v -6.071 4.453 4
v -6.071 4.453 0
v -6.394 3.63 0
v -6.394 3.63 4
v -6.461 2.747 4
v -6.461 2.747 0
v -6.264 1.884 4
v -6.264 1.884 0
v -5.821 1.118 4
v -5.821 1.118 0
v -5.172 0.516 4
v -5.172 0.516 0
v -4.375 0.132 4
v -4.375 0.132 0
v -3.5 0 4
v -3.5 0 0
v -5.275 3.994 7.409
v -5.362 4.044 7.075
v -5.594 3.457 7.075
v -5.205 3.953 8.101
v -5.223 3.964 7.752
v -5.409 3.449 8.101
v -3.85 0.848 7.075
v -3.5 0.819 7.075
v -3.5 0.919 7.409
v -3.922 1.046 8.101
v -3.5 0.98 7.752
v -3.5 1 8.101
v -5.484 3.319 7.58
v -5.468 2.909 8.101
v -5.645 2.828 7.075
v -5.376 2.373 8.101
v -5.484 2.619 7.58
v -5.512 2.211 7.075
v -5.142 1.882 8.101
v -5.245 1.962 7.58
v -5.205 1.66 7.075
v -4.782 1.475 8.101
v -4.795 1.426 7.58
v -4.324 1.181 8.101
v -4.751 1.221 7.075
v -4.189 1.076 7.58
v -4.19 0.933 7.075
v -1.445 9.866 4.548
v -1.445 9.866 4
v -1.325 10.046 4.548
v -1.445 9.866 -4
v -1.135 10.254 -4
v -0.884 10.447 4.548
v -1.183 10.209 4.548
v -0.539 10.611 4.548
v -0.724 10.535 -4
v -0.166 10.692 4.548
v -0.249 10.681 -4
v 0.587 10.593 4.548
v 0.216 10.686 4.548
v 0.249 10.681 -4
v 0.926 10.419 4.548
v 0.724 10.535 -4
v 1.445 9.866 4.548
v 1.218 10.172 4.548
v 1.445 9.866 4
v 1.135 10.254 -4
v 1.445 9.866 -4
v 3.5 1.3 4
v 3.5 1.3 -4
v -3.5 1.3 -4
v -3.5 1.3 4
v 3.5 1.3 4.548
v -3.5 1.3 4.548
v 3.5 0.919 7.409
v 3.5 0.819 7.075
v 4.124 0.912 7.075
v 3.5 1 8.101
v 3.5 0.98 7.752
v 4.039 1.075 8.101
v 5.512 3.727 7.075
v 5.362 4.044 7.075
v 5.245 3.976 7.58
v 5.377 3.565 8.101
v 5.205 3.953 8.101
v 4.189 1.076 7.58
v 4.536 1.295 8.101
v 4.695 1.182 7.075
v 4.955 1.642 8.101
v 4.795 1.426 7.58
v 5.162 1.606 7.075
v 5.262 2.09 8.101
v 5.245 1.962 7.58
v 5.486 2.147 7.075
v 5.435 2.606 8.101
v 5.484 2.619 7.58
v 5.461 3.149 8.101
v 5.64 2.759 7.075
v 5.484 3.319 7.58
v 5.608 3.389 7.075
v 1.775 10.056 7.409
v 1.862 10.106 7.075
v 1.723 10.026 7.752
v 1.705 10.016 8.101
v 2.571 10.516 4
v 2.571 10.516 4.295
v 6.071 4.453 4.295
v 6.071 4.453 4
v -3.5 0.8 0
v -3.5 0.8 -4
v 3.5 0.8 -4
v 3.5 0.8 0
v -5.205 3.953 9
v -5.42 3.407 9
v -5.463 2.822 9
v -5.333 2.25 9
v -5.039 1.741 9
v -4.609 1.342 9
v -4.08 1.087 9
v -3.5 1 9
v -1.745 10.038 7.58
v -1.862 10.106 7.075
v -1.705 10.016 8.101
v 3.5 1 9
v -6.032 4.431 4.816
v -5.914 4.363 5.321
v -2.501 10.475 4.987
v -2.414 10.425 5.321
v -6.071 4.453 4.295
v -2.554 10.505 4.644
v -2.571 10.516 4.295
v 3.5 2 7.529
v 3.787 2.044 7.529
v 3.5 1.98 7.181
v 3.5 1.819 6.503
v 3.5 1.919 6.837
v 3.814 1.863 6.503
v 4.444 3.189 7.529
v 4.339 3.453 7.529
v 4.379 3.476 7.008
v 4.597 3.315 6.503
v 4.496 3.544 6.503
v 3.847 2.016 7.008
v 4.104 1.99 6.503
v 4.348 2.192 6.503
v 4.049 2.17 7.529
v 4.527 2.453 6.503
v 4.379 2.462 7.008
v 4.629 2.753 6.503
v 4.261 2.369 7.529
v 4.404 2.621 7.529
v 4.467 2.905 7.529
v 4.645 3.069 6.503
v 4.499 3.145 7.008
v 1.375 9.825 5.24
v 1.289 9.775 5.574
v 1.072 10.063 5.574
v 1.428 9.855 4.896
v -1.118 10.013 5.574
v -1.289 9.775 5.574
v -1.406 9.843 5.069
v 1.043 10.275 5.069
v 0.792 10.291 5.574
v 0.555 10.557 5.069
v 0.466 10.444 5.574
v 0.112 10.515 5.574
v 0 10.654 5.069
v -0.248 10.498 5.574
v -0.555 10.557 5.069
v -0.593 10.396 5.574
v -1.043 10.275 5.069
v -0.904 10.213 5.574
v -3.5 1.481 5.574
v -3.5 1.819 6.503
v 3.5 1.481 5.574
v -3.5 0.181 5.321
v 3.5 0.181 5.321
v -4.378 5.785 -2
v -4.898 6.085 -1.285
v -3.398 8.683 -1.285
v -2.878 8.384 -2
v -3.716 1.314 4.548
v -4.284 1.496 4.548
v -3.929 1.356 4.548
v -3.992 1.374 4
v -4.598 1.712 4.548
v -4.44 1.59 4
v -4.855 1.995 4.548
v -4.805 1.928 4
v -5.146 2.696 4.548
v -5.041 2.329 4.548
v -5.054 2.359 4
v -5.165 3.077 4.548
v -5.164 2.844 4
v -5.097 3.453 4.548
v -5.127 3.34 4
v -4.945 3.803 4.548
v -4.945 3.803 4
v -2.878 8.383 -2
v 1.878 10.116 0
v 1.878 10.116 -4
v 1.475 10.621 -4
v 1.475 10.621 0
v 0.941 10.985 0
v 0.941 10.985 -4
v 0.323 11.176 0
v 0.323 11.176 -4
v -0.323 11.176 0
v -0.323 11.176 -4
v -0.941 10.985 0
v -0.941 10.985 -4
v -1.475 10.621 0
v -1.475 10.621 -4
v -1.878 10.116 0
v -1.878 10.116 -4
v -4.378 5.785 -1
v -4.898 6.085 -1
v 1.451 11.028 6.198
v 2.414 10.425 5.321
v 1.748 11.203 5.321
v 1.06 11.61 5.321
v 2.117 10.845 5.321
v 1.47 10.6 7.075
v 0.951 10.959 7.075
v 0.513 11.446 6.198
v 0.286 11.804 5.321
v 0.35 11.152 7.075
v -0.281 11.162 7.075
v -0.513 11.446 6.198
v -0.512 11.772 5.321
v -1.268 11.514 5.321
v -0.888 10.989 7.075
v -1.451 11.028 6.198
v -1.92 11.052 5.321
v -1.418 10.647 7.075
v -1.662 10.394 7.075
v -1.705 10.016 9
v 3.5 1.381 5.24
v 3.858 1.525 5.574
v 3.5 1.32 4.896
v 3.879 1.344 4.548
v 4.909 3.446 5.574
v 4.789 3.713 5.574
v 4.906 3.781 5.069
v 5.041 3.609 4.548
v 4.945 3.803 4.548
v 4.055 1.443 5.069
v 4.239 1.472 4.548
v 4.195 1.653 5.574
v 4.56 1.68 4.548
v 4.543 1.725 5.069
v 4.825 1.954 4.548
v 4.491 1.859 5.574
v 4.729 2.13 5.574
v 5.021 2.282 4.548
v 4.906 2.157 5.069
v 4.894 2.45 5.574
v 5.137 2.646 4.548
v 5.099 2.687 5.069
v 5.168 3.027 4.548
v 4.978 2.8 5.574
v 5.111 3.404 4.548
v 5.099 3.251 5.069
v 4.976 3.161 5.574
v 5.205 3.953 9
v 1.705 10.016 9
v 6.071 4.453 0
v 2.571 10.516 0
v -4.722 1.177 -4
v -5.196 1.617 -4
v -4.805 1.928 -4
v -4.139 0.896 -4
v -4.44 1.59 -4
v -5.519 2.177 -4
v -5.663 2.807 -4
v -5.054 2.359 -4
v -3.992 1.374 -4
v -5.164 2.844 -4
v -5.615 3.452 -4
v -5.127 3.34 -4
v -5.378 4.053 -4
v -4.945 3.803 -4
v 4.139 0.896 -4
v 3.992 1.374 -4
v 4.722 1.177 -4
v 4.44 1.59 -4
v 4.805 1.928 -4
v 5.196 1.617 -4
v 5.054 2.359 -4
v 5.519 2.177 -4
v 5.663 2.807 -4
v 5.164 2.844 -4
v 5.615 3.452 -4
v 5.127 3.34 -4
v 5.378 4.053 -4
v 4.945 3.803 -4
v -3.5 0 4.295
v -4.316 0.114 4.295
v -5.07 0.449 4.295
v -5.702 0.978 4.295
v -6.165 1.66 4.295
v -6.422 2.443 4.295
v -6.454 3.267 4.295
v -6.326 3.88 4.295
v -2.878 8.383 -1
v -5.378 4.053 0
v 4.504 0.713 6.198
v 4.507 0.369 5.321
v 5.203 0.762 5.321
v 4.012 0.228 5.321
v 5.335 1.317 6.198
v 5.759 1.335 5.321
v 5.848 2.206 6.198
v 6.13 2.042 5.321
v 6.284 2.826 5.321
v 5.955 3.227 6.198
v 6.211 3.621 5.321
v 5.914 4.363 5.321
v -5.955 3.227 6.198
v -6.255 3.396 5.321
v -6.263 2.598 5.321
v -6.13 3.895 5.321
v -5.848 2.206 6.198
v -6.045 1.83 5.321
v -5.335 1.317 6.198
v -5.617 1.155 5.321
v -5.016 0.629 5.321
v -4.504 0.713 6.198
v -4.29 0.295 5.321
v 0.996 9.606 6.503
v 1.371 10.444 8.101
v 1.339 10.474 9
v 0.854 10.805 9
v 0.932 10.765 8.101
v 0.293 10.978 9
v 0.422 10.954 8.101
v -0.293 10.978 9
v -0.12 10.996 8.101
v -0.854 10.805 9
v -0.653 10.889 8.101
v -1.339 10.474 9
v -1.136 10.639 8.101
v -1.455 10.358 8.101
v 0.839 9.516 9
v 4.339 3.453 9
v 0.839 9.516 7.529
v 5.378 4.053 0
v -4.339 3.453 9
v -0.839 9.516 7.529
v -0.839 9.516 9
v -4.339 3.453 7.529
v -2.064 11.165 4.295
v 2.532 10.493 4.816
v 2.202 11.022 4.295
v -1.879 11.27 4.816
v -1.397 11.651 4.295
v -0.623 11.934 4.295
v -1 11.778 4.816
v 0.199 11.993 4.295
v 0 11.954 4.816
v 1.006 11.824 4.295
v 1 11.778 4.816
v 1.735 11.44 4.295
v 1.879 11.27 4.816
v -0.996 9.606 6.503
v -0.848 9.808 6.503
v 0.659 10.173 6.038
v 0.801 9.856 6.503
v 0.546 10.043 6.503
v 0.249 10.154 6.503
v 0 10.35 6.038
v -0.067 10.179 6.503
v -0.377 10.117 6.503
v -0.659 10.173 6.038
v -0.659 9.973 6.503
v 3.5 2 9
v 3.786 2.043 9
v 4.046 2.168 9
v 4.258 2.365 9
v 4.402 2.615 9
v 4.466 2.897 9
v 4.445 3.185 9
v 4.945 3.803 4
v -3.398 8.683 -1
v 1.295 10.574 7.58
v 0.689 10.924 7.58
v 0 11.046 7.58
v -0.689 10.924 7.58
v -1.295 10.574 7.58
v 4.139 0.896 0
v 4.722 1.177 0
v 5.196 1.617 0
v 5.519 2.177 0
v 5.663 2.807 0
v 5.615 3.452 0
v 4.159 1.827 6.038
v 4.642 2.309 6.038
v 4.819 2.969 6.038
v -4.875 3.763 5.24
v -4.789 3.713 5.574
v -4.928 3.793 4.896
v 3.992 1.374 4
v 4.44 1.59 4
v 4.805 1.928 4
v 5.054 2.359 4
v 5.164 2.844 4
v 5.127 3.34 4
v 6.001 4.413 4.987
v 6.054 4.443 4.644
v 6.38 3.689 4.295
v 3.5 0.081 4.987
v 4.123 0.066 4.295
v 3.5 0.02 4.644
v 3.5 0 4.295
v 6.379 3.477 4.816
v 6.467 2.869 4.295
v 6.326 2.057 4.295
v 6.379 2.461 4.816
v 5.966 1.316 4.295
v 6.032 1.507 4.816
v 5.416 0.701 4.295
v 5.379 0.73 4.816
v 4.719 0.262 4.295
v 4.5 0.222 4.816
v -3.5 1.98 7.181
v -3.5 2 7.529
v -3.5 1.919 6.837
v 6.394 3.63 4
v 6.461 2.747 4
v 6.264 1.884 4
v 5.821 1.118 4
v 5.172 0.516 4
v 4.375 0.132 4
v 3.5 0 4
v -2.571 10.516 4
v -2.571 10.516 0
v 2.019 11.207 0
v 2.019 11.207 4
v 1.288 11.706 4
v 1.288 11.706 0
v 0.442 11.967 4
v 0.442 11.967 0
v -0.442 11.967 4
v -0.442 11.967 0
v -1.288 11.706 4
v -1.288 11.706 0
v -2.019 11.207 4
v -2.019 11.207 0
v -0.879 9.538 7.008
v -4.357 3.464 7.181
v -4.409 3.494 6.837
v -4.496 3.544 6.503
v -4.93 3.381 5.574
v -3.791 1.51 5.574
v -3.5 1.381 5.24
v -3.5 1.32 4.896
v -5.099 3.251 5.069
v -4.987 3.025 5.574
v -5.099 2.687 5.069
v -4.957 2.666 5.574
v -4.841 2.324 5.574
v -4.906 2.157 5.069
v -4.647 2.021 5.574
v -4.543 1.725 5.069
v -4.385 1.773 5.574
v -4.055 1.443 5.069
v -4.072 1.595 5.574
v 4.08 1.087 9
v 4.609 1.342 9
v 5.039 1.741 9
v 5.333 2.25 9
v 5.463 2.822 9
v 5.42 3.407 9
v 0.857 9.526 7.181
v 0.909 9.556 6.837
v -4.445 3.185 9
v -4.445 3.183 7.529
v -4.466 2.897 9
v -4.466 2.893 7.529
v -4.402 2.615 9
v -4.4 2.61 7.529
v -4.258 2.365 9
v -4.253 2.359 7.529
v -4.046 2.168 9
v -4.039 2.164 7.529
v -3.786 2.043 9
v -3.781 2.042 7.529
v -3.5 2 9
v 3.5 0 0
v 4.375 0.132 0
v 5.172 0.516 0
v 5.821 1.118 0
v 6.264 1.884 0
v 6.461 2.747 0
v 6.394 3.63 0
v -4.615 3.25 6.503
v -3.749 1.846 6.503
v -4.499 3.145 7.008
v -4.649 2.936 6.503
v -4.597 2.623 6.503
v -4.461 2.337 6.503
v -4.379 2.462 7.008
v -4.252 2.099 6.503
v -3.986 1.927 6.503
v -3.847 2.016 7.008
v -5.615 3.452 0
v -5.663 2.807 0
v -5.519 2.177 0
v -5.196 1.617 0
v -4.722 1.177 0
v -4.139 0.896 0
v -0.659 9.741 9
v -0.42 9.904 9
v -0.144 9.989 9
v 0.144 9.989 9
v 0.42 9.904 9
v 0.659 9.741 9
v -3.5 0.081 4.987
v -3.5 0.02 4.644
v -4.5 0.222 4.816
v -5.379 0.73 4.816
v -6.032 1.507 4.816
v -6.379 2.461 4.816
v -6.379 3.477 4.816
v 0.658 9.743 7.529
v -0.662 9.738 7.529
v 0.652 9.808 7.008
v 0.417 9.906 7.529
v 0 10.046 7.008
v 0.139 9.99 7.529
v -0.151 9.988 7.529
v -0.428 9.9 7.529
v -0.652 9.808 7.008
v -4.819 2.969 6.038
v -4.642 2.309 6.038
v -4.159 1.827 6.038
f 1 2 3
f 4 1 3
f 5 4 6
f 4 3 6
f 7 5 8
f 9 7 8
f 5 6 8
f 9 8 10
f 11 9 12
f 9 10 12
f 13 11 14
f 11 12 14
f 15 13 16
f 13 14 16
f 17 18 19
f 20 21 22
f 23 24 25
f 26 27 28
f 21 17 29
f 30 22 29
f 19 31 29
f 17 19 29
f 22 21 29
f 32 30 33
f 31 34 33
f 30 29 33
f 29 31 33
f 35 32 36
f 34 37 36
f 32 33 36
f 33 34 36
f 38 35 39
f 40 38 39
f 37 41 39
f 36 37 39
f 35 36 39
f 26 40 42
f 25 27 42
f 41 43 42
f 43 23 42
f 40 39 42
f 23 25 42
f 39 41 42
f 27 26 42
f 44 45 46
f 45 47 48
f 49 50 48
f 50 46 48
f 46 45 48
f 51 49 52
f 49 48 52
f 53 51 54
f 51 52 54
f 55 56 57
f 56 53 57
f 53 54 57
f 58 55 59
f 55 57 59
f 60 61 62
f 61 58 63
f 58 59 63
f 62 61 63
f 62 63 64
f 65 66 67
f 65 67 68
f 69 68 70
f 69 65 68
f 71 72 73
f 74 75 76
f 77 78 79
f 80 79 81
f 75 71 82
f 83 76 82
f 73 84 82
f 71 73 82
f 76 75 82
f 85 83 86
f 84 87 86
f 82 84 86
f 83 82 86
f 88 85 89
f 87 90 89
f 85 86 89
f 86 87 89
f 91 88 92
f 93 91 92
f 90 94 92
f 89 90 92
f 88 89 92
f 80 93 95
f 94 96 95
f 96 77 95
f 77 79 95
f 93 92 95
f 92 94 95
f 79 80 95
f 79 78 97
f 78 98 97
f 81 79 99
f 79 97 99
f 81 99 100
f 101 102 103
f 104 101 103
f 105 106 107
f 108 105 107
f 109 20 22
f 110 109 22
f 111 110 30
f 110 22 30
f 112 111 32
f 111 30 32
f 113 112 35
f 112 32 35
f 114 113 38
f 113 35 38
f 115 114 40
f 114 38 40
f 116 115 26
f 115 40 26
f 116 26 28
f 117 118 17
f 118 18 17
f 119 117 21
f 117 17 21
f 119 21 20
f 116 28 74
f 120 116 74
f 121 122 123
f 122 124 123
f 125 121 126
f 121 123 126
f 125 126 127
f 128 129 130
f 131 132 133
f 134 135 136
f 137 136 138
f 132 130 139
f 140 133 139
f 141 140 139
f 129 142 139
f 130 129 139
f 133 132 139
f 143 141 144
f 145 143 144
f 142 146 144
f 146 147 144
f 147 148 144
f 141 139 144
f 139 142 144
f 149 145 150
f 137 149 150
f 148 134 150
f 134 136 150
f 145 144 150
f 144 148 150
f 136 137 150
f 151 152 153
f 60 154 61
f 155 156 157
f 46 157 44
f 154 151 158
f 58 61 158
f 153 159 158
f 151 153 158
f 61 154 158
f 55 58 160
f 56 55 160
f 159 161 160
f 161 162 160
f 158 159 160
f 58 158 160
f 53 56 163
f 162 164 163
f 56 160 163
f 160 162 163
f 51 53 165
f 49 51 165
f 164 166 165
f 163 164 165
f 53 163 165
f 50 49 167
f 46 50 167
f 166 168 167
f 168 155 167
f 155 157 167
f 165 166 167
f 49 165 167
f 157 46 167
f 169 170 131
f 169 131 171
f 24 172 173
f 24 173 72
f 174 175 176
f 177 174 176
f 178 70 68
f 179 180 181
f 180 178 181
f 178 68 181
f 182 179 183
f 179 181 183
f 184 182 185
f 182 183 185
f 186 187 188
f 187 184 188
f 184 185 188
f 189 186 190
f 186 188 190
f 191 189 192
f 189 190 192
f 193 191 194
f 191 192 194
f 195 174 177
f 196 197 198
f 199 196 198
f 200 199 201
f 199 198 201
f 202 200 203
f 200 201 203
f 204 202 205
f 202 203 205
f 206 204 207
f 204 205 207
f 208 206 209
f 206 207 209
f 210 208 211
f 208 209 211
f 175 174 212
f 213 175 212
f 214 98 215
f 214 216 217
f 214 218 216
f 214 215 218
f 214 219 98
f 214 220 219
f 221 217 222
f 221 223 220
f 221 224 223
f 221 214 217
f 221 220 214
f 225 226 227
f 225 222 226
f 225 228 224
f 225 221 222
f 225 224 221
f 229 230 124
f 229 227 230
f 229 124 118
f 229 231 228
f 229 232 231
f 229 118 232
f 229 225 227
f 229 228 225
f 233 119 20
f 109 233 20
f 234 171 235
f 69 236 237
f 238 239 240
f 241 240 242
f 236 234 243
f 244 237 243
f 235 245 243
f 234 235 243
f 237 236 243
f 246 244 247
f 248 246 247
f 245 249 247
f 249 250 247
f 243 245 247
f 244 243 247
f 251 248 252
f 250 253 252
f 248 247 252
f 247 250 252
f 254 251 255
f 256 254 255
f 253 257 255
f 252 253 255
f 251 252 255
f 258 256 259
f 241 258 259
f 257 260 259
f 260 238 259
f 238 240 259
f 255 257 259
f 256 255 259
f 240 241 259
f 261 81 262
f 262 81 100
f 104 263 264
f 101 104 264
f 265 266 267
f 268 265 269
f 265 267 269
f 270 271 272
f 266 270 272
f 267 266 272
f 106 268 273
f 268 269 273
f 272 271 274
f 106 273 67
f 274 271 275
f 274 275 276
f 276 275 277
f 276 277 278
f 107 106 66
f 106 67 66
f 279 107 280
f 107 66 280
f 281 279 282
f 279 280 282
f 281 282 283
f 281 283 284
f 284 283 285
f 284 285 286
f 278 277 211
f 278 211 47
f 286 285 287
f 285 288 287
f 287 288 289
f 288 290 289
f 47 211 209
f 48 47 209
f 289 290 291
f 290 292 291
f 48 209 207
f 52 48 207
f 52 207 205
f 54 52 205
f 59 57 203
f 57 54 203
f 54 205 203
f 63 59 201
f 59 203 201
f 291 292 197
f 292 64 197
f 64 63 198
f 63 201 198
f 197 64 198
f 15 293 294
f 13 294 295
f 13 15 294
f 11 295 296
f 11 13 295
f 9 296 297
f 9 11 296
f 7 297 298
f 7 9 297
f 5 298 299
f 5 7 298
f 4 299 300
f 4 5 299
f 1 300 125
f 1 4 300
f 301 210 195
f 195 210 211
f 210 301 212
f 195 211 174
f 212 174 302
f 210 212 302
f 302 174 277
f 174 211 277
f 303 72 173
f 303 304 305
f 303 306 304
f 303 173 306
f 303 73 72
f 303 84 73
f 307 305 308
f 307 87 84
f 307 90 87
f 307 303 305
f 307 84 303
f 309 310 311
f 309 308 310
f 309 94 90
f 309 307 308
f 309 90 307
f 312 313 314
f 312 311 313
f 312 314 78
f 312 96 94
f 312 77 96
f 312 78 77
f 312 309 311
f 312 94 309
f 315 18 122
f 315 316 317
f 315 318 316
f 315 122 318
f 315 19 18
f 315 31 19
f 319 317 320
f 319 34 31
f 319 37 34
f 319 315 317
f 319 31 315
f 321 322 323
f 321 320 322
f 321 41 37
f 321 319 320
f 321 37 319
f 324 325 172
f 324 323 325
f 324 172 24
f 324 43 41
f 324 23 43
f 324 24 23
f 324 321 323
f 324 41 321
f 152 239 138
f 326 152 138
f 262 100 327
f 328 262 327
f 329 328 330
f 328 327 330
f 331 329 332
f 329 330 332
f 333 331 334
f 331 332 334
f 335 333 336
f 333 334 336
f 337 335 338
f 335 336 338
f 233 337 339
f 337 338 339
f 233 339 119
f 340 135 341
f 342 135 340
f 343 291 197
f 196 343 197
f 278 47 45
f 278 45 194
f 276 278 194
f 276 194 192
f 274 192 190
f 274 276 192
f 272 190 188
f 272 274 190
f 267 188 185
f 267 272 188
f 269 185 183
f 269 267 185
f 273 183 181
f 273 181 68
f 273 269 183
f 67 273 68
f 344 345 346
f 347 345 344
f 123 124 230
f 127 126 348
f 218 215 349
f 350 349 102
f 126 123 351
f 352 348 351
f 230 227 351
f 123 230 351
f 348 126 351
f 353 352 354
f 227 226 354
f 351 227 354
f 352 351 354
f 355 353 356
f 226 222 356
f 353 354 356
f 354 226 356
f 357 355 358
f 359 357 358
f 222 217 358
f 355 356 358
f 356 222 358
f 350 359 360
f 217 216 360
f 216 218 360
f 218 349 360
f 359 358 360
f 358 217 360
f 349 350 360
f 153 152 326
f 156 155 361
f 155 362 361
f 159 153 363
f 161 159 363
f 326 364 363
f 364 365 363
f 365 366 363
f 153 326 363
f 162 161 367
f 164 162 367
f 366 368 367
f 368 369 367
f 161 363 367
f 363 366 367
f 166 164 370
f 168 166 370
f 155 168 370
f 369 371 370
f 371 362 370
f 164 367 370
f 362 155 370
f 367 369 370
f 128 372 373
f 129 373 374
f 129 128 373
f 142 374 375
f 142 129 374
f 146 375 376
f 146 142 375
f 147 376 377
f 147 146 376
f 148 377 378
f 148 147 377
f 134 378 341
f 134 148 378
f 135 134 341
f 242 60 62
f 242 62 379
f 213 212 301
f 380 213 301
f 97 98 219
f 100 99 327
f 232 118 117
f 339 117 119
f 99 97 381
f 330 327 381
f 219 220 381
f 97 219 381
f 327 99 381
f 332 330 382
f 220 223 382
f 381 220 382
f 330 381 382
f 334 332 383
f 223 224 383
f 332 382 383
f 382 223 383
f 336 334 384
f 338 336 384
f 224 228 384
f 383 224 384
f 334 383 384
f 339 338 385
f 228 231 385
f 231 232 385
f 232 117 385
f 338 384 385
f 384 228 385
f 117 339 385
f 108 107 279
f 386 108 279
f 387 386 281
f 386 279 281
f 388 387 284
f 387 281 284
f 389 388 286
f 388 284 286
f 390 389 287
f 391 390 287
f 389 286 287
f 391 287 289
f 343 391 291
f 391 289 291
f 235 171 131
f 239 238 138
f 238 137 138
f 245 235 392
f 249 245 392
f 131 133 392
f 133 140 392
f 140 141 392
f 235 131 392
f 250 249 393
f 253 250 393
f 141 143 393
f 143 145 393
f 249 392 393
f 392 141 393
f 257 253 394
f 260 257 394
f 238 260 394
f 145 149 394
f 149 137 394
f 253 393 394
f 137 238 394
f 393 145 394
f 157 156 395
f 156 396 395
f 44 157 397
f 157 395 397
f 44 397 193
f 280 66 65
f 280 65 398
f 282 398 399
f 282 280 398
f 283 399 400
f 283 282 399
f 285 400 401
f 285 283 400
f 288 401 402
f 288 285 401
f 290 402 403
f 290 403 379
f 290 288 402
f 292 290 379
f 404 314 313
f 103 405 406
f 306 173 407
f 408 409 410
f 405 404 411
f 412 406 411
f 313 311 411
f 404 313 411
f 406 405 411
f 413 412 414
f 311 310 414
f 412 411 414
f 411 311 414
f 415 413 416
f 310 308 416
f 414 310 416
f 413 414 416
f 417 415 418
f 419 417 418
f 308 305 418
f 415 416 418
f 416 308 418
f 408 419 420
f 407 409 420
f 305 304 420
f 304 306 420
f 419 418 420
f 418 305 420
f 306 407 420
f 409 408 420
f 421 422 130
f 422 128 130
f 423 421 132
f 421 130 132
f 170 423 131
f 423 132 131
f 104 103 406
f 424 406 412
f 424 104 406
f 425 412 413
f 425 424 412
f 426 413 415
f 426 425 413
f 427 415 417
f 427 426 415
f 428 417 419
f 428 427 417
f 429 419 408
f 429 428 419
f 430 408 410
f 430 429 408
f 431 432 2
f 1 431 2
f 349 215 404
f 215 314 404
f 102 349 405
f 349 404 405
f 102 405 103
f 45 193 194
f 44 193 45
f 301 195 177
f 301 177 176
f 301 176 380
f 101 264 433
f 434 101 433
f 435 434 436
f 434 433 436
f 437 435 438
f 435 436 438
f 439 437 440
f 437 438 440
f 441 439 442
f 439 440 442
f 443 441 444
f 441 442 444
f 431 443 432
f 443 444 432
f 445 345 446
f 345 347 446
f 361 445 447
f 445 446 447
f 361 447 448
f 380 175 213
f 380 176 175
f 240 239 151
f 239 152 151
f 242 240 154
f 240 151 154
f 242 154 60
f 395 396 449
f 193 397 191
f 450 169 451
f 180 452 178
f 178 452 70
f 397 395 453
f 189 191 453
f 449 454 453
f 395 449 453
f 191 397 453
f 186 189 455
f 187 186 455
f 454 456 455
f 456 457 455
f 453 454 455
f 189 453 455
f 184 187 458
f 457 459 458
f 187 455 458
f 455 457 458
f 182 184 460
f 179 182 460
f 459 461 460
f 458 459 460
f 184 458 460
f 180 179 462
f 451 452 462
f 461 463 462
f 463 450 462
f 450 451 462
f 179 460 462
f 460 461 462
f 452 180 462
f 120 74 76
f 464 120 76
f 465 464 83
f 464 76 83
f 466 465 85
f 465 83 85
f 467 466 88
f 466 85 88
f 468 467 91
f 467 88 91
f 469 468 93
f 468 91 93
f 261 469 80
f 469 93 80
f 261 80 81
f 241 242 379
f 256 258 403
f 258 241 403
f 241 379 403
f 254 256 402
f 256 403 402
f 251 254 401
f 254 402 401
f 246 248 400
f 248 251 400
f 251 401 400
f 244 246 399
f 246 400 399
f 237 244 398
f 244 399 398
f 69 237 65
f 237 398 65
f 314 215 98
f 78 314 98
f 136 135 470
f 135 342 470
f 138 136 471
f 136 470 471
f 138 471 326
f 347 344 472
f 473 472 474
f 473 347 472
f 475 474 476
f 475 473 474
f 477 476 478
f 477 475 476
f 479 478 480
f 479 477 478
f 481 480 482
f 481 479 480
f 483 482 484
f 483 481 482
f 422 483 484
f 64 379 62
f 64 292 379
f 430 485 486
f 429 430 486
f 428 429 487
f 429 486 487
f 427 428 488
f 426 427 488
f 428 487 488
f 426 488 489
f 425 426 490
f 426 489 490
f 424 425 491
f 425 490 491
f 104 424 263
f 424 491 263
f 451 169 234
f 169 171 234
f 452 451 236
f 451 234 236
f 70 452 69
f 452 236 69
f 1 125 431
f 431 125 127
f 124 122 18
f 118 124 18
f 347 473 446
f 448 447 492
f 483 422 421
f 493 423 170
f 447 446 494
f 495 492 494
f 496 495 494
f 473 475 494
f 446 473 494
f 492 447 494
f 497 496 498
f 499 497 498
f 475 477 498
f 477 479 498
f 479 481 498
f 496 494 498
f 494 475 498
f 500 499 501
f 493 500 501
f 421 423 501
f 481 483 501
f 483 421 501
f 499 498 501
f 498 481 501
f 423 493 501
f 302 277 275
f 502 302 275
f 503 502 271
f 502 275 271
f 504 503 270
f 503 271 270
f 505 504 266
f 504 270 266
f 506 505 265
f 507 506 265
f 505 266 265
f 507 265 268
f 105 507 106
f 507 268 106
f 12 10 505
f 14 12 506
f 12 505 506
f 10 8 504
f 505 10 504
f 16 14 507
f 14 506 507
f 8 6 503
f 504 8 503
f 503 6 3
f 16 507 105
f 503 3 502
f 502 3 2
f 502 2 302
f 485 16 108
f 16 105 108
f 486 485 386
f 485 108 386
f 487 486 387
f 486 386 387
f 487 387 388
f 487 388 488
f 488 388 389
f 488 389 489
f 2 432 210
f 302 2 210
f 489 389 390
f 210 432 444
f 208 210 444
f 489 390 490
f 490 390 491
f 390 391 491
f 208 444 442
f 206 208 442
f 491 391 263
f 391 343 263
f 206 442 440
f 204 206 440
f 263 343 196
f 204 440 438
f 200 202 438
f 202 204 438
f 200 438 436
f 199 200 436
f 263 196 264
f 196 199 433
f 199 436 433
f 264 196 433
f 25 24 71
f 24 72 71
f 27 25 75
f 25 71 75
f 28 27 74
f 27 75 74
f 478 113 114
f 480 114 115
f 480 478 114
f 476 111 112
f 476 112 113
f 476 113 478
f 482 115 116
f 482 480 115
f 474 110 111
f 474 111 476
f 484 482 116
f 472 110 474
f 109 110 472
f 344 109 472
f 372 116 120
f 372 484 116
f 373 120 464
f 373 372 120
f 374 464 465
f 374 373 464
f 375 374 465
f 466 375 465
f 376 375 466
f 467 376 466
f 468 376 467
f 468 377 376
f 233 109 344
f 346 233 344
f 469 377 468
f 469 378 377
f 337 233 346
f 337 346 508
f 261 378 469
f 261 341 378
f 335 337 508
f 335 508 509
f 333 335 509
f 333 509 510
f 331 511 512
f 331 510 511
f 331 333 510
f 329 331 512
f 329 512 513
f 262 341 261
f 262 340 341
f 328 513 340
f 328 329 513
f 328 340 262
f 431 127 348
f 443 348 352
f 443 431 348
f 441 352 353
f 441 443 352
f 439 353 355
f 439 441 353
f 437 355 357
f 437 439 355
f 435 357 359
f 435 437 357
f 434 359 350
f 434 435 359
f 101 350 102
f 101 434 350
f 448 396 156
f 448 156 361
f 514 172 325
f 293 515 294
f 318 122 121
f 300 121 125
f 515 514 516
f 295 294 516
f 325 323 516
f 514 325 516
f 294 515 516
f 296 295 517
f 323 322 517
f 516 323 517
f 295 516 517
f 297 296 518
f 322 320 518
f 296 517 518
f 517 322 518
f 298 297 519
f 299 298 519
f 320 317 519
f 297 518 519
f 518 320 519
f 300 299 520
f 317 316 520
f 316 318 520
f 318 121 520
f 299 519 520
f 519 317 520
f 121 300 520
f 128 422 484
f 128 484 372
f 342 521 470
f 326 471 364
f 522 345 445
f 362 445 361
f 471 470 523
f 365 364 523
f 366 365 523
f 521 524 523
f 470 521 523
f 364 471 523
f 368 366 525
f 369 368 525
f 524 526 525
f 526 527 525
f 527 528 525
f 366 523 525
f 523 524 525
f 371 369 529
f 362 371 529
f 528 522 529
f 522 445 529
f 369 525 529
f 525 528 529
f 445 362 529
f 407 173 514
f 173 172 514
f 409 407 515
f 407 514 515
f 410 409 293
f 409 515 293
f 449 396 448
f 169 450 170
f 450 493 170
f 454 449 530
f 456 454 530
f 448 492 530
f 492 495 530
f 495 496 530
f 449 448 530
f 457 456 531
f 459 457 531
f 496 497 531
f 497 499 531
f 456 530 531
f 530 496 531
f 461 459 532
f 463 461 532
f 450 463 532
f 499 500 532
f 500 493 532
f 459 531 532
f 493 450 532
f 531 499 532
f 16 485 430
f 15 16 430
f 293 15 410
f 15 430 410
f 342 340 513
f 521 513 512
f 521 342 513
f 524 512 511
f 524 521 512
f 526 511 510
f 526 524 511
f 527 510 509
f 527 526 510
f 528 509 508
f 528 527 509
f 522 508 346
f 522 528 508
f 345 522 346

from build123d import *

# Parameters (mm, degrees)
EXTRUDE_1_DEPTH  = 4
EXTRUDE_2_DEPTH  = 4
EXTRUDE_3_DEPTH  = 5
CHAMFER_1_SIZE   = 1.3
CHAMFER_1_SIZE_2 = 3.571720645
CHAMFER_2_SIZE   = 3
CHAMFER_2_SIZE_2 = 1.091910703
FILLET_1_R       = 3
SKETCH_5_W       = 1
SKETCH_5_H       = 3
EXTRUDE_4_DEPTH  = 0.6
CHAMFER_3_SIZE2  = 0.715052156
CHAMFER_3_SIZE   = 0.6


# Some blends are built 0.0001 mm under size
with BuildPart() as part:
    # Эскиз2 → Бобышка-Вытянуть1 (new body)
    with BuildSketch(Plane.XY.offset(-4)):
        with BuildLine():
            Line((5.3783321, 4.05336663), (1.8783321, 10.115544457))
            ThreePointArc((1.8783321, 10.115544457), (0, 11.2), (-1.8783321, 10.115544457))
            Line((-1.8783321, 10.115544457), (-5.3783321, 4.05336663))
            ThreePointArc((-5.3783321, 4.05336663), (-5.3783321, 1.884455543), (-3.5, 0.8))
            Line((-3.5, 0.8), (3.5, 0.8))
            ThreePointArc((3.5, 0.8), (5.3783321, 1.884455543), (5.3783321, 4.05336663))
        make_face()
        with BuildLine():
            Line((-1.445319398, 9.865544457), (-4.945319398, 3.80336663))
            ThreePointArc((-4.945319398, 3.80336663), (-4.945319398, 2.134455543), (-3.5, 1.3))
            Line((-3.5, 1.3), (3.5, 1.3))
            ThreePointArc((3.5, 1.3), (4.945319398, 2.134455543), (4.945319398, 3.80336663))
            Line((4.945319398, 3.80336663), (1.445319398, 9.865544457))
            ThreePointArc((1.445319398, 9.865544457), (0, 10.7), (-1.445319398, 9.865544457))
        make_face(mode=Mode.SUBTRACT)
    extrude(amount=EXTRUDE_1_DEPTH)

    # Эскиз3 → Бобышка-Вытянуть2 (add)
    with BuildSketch(Plane.XY):
        with BuildLine():
            Line((-3.5, 0), (3.5, 0))
            ThreePointArc((3.5, 0), (6.071152423, 1.484455543), (6.071152423, 4.45336663))
            Line((6.071152423, 4.45336663), (2.571152423, 10.515544457))
            ThreePointArc((2.571152423, 10.515544457), (0, 12), (-2.571152423, 10.515544457))
            Line((-2.571152423, 10.515544457), (-6.071152423, 4.45336663))
            ThreePointArc((-6.071152423, 4.45336663), (-6.071152423, 1.484455543), (-3.5, 0))
        make_face()
        with BuildLine():
            Line((4.945319398, 3.80336663), (1.445319398, 9.865544457))
            ThreePointArc((1.445319398, 9.865544457), (0, 10.7), (-1.445319398, 9.865544457))
            Line((-1.445319398, 9.865544457), (-4.945319398, 3.80336663))
            ThreePointArc((-4.945319398, 3.80336663), (-4.945319398, 2.134455543), (-3.5, 1.3))
            Line((-3.5, 1.3), (3.5, 1.3))
            ThreePointArc((3.5, 1.3), (4.945319398, 2.134455543), (4.945319398, 3.80336663))
        make_face(mode=Mode.SUBTRACT)
    extrude(amount=EXTRUDE_2_DEPTH)

    # Эскиз4 → Бобышка-Вытянуть3 (add)
    with BuildSketch(Plane.XY.offset(4)):
        with BuildLine():
            Line((-1.705127019, 10.015544457), (-5.205127019, 3.95336663))
            ThreePointArc((-5.205127019, 3.95336663), (-5.205127019, 1.984455543), (-3.5, 1))
            Line((-3.5, 1), (3.5, 1))
            ThreePointArc((3.5, 1), (5.205127019, 1.984455543), (5.205127019, 3.95336663))
            Line((5.205127019, 3.95336663), (1.705127019, 10.015544457))
            ThreePointArc((1.705127019, 10.015544457), (0, 11), (-1.705127019, 10.015544457))
        make_face()
        with BuildLine():
            Line((-3.5, 2), (3.5, 2))
            ThreePointArc((3.5, 2), (4.339101615, 2.484455543), (4.339101615, 3.45336663))
            Line((4.339101615, 3.45336663), (0.839101615, 9.515544457))
            ThreePointArc((0.839101615, 9.515544457), (0, 10), (-0.839101615, 9.515544457))
            Line((-0.839101615, 9.515544457), (-4.339101615, 3.45336663))
            ThreePointArc((-4.339101615, 3.45336663), (-4.339101615, 2.484455543), (-3.5, 2))
        make_face(mode=Mode.SUBTRACT)
    extrude(amount=EXTRUDE_3_DEPTH)

    # Фаска1
    # the kernel refuses this chamfer: 3.571720645, 1.3 mm, written as the material it adds along each edge
    with BuildSketch(Plane(origin=(-3.5, 1, 4), x_dir=(0, -0.9950833631817486, -0.09904090225205049), z_dir=(1, 0, 0))) as chamfer_1_piece_1_section:
        Polygon((CHAMFER_1_SIZE * 0.995083363182, -CHAMFER_1_SIZE * 0.0990409022521), (-CHAMFER_1_SIZE_2 * 0.0990409022601, -CHAMFER_1_SIZE_2 * 0.995083363263), (0, 0), align=None)
    chamfer_1_piece_1 = extrude(amount=7, mode=Mode.PRIVATE)
    chamfer_1_piece_1 = split(chamfer_1_piece_1, bisect_by=Plane(origin=(-7e-09, 0, 5.183770474), z_dir=(0, 1, 0)), keep=Keep.TOP, mode=Mode.PRIVATE)
    add(chamfer_1_piece_1)
    with BuildSketch(Plane(origin=(3.5, 2.968911087, 4), x_dir=(0, -1, 0), z_dir=(-1, 0, 0))) as chamfer_1_piece_2_section:
        Polygon((1.968911087 + CHAMFER_1_SIZE, 0), (1.968911087, CHAMFER_1_SIZE_2), (1.968911087, 0), align=None)
    chamfer_1_piece_2 = revolve(axis=Axis((3.5, 2.968911087, 4), (0, 0, 1)), revolution_arc=120, mode=Mode.PRIVATE)
    chamfer_1_piece_2 = chamfer_1_piece_2 & Plane(origin=(3.5, 2.968911087, 5.239170832), x_dir=(0, -1, 0), z_dir=(0, 0, -1)) * Cylinder(2.968911087, 15, mode=Mode.PRIVATE)
    add(chamfer_1_piece_2)
    with BuildSketch(Plane(origin=(-3.5, 2.968911087, 4), x_dir=(-0.8660254037844399, 0.4999999999999977, 0), z_dir=(0.4999999999999977, 0.8660254037844399, 0))) as chamfer_1_piece_3_section:
        Polygon((1.968911087 + CHAMFER_1_SIZE, 0), (1.968911087, CHAMFER_1_SIZE_2), (1.968911087, 0), align=None)
    chamfer_1_piece_3 = revolve(axis=Axis((-3.5, 2.968911087, 4), (0, 0, 1)), revolution_arc=120, mode=Mode.PRIVATE)
    chamfer_1_piece_3 = chamfer_1_piece_3 & Plane(origin=(-3.5, 2.968911087, 5.239170832), x_dir=(-0.8660254037844396, 0.4999999999999984, 0), z_dir=(0, 0, -1)) * Cylinder(2.968911087, 15, mode=Mode.PRIVATE)
    add(chamfer_1_piece_3)
    with BuildSketch(Plane(origin=(5.205127019, 3.95336663, 4), x_dir=(0.8617674713986507, 0.497541681590875, -0.09904090225205049), z_dir=(-0.5000000000000007, 0.8660254037844384, 0))) as chamfer_1_piece_4_section:
        Polygon((CHAMFER_1_SIZE * 0.995083363182, -CHAMFER_1_SIZE * 0.0990409022521), (-CHAMFER_1_SIZE_2 * 0.0990409022601, -CHAMFER_1_SIZE_2 * 0.995083363263), (0, 0), align=None)
    chamfer_1_piece_4 = extrude(amount=7, mode=Mode.PRIVATE)
    chamfer_1_piece_4 = split(chamfer_1_piece_4, bisect_by=Plane(origin=(4.321152424, 7.484455541, 5.183770458), z_dir=(-0.8660254037844383, -0.5000000000000007, 0)), keep=Keep.TOP, mode=Mode.PRIVATE)
    add(chamfer_1_piece_4)
    with BuildSketch(Plane(origin=(-1.705127019, 10.015544457, 4), x_dir=(-0.8617674713986511, 0.49754168159087425, -0.09904090225205052), z_dir=(-0.49999999999999994, -0.8660254037844387, 0))) as chamfer_1_piece_5_section:
        Polygon((CHAMFER_1_SIZE * 0.995083363182, -CHAMFER_1_SIZE * 0.0990409022521), (-CHAMFER_1_SIZE_2 * 0.0990409022601, -CHAMFER_1_SIZE_2 * 0.995083363263), (0, 0), align=None)
    chamfer_1_piece_5 = extrude(amount=7, mode=Mode.PRIVATE)
    chamfer_1_piece_5 = split(chamfer_1_piece_5, bisect_by=Plane(origin=(-4.321152422, 7.484455545, 5.183770458), z_dir=(0.8660254037844385, -0.5000000000000003, 0)), keep=Keep.TOP, mode=Mode.PRIVATE)
    add(chamfer_1_piece_5)
    with BuildSketch(Plane(origin=(0, 9.031088913, 4), x_dir=(0.866025403784439, 0.49999999999999944, 0), z_dir=(0.49999999999999944, -0.866025403784439, 0))) as chamfer_1_piece_6_section:
        Polygon((1.968911087 + CHAMFER_1_SIZE, 0), (1.968911087, CHAMFER_1_SIZE_2), (1.968911087, 0), align=None)
    chamfer_1_piece_6 = revolve(axis=Axis((0, 9.031088913, 4), (0, 0, 1)), revolution_arc=120, mode=Mode.PRIVATE)
    chamfer_1_piece_6 = chamfer_1_piece_6 & Plane(origin=(0, 9.031088913, 5.239170832), x_dir=(0.866025403784439, 0.49999999999999933, 0), z_dir=(0, 0, -1)) * Cylinder(2.968911087, 15, mode=Mode.PRIVATE)
    add(chamfer_1_piece_6)

    # Фаска2
    # the kernel refuses this chamfer: 3, 1.091910703 mm, written as the material it takes off along each edge
    with BuildSketch(Plane(origin=(-3.5, 2, 4), x_dir=(0, 0.013184058198645864, 0.9999130865277315), z_dir=(1, 0, 0))) as chamfer_2_piece_1_section:
        Polygon((CHAMFER_2_SIZE * 0.999913086528, CHAMFER_2_SIZE * 0.0131840581986), (-CHAMFER_2_SIZE_2 * 0.0131840581962, CHAMFER_2_SIZE_2 * 0.999913086343), (0, 0), align=None)
    chamfer_2_piece_1 = extrude(amount=7, mode=Mode.PRIVATE)
    chamfer_2_piece_1 = split(chamfer_2_piece_1, bisect_by=Plane(origin=(-2.923308358, 1.3, 5.225786657), z_dir=(0, 1, 0)), keep=Keep.TOP, mode=Mode.PRIVATE)
    add(chamfer_2_piece_1, mode=Mode.SUBTRACT)
    with BuildSketch(Plane(origin=(3.5, 2.968911087, 4), x_dir=(0, -1, 0), z_dir=(-1, 0, 0))) as chamfer_2_piece_2_section:
        Polygon((0.968911087 + CHAMFER_2_SIZE_2, 0), (0.968911087, CHAMFER_2_SIZE), (0.968911087, 0), align=None)
    chamfer_2_piece_2 = revolve(axis=Axis((3.5, 2.968911087, 4), (0, 0, 1)), revolution_arc=120, mode=Mode.PRIVATE)
    chamfer_2_piece_2 = chamfer_2_piece_2 & Plane(origin=(3.5, 2.968911087, 5.086168239), x_dir=(0, -1, 0), z_dir=(0, 0, -1)) * Cylinder(1.668911087, 12, mode=Mode.PRIVATE)
    add(chamfer_2_piece_2, mode=Mode.SUBTRACT)
    with BuildSketch(Plane(origin=(-3.5, 2.968911087, 4), x_dir=(-0.8660254037844419, 0.4999999999999944, 0), z_dir=(0.4999999999999944, 0.8660254037844419, 0))) as chamfer_2_piece_3_section:
        Polygon((0.968911087 + CHAMFER_2_SIZE_2, 0), (0.968911087, CHAMFER_2_SIZE), (0.968911087, 0), align=None)
    chamfer_2_piece_3 = revolve(axis=Axis((-3.5, 2.968911087, 4), (0, 0, 1)), revolution_arc=120, mode=Mode.PRIVATE)
    chamfer_2_piece_3 = chamfer_2_piece_3 & Plane(origin=(-3.5, 2.968911087, 5.086168239), x_dir=(-0.8660254037844405, 0.49999999999999695, 0), z_dir=(0, 0, -1)) * Cylinder(1.668911087, 12, mode=Mode.PRIVATE)
    add(chamfer_2_piece_3, mode=Mode.SUBTRACT)
    with BuildSketch(Plane(origin=(4.339101615, 3.45336663, 4), x_dir=(0.8617674713986508, 0.4975416815908748, -0.09904090225204927), z_dir=(-0.5000000000000004, 0.8660254037844384, 0))) as chamfer_2_piece_4_section:
        Polygon((CHAMFER_2_SIZE_2 * 0.995083362998, -CHAMFER_2_SIZE_2 * 0.0990409022338), (-CHAMFER_2_SIZE * 0.099040902252, -CHAMFER_2_SIZE * 0.995083363182), (0, 0), align=None)
    chamfer_2_piece_4 = extrude(amount=7, mode=Mode.PRIVATE)
    chamfer_2_piece_4 = split(chamfer_2_piece_4, bisect_by=Plane(origin=(3.195319408, 6.834455526, 5.1059003), z_dir=(-0.8660254037844385, -0.5000000000000004, 0)), keep=Keep.TOP, mode=Mode.PRIVATE)
    add(chamfer_2_piece_4, mode=Mode.SUBTRACT)
    with BuildSketch(Plane(origin=(-0.839101615, 9.515544457, 4), x_dir=(-0.8617674713986513, 0.4975416815908743, -0.09904090225204927), z_dir=(-0.49999999999999994, -0.8660254037844387, 0))) as chamfer_2_piece_5_section:
        Polygon((CHAMFER_2_SIZE_2 * 0.995083362998, -CHAMFER_2_SIZE_2 * 0.0990409022338), (-CHAMFER_2_SIZE * 0.099040902252, -CHAMFER_2_SIZE * 0.995083363182), (0, 0), align=None)
    chamfer_2_piece_5 = extrude(amount=7, mode=Mode.PRIVATE)
    chamfer_2_piece_5 = split(chamfer_2_piece_5, bisect_by=Plane(origin=(-3.195319387, 6.834455562, 5.1059003), z_dir=(0.8660254037844387, -0.4999999999999999, 0)), keep=Keep.TOP, mode=Mode.PRIVATE)
    add(chamfer_2_piece_5, mode=Mode.SUBTRACT)
    with BuildSketch(Plane(origin=(0, 9.031088913, 4), x_dir=(0.8660254037844403, 0.4999999999999973, 0), z_dir=(0.4999999999999973, -0.8660254037844403, 0))) as chamfer_2_piece_6_section:
        Polygon((0.968911087 + CHAMFER_2_SIZE_2, 0), (0.968911087, CHAMFER_2_SIZE), (0.968911087, 0), align=None)
    chamfer_2_piece_6 = revolve(axis=Axis((0, 9.031088913, 4), (0, 0, 1)), revolution_arc=120, mode=Mode.PRIVATE)
    chamfer_2_piece_6 = chamfer_2_piece_6 & Plane(origin=(0, 9.031088913, 5.086168239), x_dir=(0.8660254037844393, 0.49999999999999906, 0), z_dir=(0, 0, -1)) * Cylinder(1.668911087, 12, mode=Mode.PRIVATE)
    add(chamfer_2_piece_6, mode=Mode.SUBTRACT)

    # Скругление1
    fillet_1_edges = [part.edges().sort_by_distance(p)[0] for p in [
        (0, 1, 7.571720645),
        (5.205127019, 1.984455543, 7.571720645),
        (-5.205127019, 1.984455543, 7.571720645),
        (3.455127019, 6.984455543, 7.571720645),
        (-3.455127019, 6.984455543, 7.571720645),
        (0, 11, 7.571720645),
        (0, 0, 4.824243226),
        (6.071152423, 1.484455543, 4.824243226),
        (-6.071152423, 1.484455543, 4.824243226),
        (4.321152423, 7.484455543, 4.824243226),
        (-4.321152423, 7.484455543, 4.824243226),
        (0, 12, 4.824243226),
        (0, 2, 7),
        (4.339101615, 2.484455543, 7),
        (-4.339101615, 2.484455543, 7),
        (2.589101615, 6.484455543, 7),
        (-2.589101615, 6.484455543, 7),
        (0, 10, 7),
        (0, 1.3, 5.076765806),
        (4.945319398, 2.134455543, 5.076765807),
        (-4.945319398, 2.134455543, 5.076765807),
        (3.195319398, 6.834455543, 5.076765806),
        (-3.195319398, 6.834455543, 5.076765806),
        (0, 10.7, 5.076765807),
    ]]
    fillet(fillet_1_edges, radius=FILLET_1_R)

    # Эскиз5 → Бобышка-Вытянуть4 (add)
    with BuildSketch(Plane(origin=(-5.788908311, 3.342227772, 0), x_dir=(0, 0, 1), z_dir=(-0.8660254037844387, 0.49999999999999983, 0))):
        with Locations((-1.5, 4.321152423)):
            Rectangle(SKETCH_5_W, SKETCH_5_H)
    extrude(amount=EXTRUDE_4_DEPTH)

    # Фаска3
    chamfer_3_edges = [part.edges().sort_by_distance(p)[0] for p in [
        (-4.147947342, 7.384455543, -2),
    ]]
    chamfer_3_side = [part.faces().sort_by_distance(p)[0] for p in [
        (-4.137555037, 7.378455543, -2),
    ]]
    chamfer(chamfer_3_edges, length=CHAMFER_3_SIZE - 0.0001, length2=CHAMFER_3_SIZE2 - 0.0001, reference=chamfer_3_side[0])  # a hair under: the kernel refuses the full size


solid = part.part
